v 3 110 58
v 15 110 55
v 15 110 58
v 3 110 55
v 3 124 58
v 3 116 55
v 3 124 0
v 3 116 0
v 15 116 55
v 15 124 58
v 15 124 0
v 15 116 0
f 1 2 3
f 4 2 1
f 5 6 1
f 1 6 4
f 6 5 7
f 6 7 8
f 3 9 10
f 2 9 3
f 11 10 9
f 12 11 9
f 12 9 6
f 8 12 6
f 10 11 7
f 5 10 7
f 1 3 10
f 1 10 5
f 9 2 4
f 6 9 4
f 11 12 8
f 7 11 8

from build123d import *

# Parameters (mm, degrees)
BOX018_W                  = 12
BOX018_H                  = 8
BOX018_DEPTH              = 55
BOX017_W                  = 12
BOX017_H                  = 14
BOX017_DEPTH              = 3
FUSION010_PLACEMENT_ANGLE = 180


with BuildPart() as sporte003:
    # Box018 → Box018 (new body)
    with BuildSketch(Plane(origin=(47, 17, 0), x_dir=(1, 0, 0), z_dir=(0, 0, 1))):
        with Locations((6, 4)):
            Rectangle(BOX018_W, BOX018_H)
    extrude(amount=BOX018_DEPTH)


with BuildPart() as l3:
    # Box017 → Box017 (new body)
    with BuildSketch(Plane(origin=(47, 17, 55), x_dir=(1, 0, 0), z_dir=(0, 0, 1))):
        with Locations((6, 7)):
            Rectangle(BOX017_W, BOX017_H)
    extrude(amount=BOX017_DEPTH)

    # Fusion010: union sporte003
    add(sporte003.part)


with BuildPart() as l3_1:
    # Fusion010 placement: moved
    add(l3.part.moved(Location((62, 141, 0))).rotate(Axis((62, 141, 0), (0, 0, 1)), FUSION010_PLACEMENT_ANGLE))


solid = l3_1.part
